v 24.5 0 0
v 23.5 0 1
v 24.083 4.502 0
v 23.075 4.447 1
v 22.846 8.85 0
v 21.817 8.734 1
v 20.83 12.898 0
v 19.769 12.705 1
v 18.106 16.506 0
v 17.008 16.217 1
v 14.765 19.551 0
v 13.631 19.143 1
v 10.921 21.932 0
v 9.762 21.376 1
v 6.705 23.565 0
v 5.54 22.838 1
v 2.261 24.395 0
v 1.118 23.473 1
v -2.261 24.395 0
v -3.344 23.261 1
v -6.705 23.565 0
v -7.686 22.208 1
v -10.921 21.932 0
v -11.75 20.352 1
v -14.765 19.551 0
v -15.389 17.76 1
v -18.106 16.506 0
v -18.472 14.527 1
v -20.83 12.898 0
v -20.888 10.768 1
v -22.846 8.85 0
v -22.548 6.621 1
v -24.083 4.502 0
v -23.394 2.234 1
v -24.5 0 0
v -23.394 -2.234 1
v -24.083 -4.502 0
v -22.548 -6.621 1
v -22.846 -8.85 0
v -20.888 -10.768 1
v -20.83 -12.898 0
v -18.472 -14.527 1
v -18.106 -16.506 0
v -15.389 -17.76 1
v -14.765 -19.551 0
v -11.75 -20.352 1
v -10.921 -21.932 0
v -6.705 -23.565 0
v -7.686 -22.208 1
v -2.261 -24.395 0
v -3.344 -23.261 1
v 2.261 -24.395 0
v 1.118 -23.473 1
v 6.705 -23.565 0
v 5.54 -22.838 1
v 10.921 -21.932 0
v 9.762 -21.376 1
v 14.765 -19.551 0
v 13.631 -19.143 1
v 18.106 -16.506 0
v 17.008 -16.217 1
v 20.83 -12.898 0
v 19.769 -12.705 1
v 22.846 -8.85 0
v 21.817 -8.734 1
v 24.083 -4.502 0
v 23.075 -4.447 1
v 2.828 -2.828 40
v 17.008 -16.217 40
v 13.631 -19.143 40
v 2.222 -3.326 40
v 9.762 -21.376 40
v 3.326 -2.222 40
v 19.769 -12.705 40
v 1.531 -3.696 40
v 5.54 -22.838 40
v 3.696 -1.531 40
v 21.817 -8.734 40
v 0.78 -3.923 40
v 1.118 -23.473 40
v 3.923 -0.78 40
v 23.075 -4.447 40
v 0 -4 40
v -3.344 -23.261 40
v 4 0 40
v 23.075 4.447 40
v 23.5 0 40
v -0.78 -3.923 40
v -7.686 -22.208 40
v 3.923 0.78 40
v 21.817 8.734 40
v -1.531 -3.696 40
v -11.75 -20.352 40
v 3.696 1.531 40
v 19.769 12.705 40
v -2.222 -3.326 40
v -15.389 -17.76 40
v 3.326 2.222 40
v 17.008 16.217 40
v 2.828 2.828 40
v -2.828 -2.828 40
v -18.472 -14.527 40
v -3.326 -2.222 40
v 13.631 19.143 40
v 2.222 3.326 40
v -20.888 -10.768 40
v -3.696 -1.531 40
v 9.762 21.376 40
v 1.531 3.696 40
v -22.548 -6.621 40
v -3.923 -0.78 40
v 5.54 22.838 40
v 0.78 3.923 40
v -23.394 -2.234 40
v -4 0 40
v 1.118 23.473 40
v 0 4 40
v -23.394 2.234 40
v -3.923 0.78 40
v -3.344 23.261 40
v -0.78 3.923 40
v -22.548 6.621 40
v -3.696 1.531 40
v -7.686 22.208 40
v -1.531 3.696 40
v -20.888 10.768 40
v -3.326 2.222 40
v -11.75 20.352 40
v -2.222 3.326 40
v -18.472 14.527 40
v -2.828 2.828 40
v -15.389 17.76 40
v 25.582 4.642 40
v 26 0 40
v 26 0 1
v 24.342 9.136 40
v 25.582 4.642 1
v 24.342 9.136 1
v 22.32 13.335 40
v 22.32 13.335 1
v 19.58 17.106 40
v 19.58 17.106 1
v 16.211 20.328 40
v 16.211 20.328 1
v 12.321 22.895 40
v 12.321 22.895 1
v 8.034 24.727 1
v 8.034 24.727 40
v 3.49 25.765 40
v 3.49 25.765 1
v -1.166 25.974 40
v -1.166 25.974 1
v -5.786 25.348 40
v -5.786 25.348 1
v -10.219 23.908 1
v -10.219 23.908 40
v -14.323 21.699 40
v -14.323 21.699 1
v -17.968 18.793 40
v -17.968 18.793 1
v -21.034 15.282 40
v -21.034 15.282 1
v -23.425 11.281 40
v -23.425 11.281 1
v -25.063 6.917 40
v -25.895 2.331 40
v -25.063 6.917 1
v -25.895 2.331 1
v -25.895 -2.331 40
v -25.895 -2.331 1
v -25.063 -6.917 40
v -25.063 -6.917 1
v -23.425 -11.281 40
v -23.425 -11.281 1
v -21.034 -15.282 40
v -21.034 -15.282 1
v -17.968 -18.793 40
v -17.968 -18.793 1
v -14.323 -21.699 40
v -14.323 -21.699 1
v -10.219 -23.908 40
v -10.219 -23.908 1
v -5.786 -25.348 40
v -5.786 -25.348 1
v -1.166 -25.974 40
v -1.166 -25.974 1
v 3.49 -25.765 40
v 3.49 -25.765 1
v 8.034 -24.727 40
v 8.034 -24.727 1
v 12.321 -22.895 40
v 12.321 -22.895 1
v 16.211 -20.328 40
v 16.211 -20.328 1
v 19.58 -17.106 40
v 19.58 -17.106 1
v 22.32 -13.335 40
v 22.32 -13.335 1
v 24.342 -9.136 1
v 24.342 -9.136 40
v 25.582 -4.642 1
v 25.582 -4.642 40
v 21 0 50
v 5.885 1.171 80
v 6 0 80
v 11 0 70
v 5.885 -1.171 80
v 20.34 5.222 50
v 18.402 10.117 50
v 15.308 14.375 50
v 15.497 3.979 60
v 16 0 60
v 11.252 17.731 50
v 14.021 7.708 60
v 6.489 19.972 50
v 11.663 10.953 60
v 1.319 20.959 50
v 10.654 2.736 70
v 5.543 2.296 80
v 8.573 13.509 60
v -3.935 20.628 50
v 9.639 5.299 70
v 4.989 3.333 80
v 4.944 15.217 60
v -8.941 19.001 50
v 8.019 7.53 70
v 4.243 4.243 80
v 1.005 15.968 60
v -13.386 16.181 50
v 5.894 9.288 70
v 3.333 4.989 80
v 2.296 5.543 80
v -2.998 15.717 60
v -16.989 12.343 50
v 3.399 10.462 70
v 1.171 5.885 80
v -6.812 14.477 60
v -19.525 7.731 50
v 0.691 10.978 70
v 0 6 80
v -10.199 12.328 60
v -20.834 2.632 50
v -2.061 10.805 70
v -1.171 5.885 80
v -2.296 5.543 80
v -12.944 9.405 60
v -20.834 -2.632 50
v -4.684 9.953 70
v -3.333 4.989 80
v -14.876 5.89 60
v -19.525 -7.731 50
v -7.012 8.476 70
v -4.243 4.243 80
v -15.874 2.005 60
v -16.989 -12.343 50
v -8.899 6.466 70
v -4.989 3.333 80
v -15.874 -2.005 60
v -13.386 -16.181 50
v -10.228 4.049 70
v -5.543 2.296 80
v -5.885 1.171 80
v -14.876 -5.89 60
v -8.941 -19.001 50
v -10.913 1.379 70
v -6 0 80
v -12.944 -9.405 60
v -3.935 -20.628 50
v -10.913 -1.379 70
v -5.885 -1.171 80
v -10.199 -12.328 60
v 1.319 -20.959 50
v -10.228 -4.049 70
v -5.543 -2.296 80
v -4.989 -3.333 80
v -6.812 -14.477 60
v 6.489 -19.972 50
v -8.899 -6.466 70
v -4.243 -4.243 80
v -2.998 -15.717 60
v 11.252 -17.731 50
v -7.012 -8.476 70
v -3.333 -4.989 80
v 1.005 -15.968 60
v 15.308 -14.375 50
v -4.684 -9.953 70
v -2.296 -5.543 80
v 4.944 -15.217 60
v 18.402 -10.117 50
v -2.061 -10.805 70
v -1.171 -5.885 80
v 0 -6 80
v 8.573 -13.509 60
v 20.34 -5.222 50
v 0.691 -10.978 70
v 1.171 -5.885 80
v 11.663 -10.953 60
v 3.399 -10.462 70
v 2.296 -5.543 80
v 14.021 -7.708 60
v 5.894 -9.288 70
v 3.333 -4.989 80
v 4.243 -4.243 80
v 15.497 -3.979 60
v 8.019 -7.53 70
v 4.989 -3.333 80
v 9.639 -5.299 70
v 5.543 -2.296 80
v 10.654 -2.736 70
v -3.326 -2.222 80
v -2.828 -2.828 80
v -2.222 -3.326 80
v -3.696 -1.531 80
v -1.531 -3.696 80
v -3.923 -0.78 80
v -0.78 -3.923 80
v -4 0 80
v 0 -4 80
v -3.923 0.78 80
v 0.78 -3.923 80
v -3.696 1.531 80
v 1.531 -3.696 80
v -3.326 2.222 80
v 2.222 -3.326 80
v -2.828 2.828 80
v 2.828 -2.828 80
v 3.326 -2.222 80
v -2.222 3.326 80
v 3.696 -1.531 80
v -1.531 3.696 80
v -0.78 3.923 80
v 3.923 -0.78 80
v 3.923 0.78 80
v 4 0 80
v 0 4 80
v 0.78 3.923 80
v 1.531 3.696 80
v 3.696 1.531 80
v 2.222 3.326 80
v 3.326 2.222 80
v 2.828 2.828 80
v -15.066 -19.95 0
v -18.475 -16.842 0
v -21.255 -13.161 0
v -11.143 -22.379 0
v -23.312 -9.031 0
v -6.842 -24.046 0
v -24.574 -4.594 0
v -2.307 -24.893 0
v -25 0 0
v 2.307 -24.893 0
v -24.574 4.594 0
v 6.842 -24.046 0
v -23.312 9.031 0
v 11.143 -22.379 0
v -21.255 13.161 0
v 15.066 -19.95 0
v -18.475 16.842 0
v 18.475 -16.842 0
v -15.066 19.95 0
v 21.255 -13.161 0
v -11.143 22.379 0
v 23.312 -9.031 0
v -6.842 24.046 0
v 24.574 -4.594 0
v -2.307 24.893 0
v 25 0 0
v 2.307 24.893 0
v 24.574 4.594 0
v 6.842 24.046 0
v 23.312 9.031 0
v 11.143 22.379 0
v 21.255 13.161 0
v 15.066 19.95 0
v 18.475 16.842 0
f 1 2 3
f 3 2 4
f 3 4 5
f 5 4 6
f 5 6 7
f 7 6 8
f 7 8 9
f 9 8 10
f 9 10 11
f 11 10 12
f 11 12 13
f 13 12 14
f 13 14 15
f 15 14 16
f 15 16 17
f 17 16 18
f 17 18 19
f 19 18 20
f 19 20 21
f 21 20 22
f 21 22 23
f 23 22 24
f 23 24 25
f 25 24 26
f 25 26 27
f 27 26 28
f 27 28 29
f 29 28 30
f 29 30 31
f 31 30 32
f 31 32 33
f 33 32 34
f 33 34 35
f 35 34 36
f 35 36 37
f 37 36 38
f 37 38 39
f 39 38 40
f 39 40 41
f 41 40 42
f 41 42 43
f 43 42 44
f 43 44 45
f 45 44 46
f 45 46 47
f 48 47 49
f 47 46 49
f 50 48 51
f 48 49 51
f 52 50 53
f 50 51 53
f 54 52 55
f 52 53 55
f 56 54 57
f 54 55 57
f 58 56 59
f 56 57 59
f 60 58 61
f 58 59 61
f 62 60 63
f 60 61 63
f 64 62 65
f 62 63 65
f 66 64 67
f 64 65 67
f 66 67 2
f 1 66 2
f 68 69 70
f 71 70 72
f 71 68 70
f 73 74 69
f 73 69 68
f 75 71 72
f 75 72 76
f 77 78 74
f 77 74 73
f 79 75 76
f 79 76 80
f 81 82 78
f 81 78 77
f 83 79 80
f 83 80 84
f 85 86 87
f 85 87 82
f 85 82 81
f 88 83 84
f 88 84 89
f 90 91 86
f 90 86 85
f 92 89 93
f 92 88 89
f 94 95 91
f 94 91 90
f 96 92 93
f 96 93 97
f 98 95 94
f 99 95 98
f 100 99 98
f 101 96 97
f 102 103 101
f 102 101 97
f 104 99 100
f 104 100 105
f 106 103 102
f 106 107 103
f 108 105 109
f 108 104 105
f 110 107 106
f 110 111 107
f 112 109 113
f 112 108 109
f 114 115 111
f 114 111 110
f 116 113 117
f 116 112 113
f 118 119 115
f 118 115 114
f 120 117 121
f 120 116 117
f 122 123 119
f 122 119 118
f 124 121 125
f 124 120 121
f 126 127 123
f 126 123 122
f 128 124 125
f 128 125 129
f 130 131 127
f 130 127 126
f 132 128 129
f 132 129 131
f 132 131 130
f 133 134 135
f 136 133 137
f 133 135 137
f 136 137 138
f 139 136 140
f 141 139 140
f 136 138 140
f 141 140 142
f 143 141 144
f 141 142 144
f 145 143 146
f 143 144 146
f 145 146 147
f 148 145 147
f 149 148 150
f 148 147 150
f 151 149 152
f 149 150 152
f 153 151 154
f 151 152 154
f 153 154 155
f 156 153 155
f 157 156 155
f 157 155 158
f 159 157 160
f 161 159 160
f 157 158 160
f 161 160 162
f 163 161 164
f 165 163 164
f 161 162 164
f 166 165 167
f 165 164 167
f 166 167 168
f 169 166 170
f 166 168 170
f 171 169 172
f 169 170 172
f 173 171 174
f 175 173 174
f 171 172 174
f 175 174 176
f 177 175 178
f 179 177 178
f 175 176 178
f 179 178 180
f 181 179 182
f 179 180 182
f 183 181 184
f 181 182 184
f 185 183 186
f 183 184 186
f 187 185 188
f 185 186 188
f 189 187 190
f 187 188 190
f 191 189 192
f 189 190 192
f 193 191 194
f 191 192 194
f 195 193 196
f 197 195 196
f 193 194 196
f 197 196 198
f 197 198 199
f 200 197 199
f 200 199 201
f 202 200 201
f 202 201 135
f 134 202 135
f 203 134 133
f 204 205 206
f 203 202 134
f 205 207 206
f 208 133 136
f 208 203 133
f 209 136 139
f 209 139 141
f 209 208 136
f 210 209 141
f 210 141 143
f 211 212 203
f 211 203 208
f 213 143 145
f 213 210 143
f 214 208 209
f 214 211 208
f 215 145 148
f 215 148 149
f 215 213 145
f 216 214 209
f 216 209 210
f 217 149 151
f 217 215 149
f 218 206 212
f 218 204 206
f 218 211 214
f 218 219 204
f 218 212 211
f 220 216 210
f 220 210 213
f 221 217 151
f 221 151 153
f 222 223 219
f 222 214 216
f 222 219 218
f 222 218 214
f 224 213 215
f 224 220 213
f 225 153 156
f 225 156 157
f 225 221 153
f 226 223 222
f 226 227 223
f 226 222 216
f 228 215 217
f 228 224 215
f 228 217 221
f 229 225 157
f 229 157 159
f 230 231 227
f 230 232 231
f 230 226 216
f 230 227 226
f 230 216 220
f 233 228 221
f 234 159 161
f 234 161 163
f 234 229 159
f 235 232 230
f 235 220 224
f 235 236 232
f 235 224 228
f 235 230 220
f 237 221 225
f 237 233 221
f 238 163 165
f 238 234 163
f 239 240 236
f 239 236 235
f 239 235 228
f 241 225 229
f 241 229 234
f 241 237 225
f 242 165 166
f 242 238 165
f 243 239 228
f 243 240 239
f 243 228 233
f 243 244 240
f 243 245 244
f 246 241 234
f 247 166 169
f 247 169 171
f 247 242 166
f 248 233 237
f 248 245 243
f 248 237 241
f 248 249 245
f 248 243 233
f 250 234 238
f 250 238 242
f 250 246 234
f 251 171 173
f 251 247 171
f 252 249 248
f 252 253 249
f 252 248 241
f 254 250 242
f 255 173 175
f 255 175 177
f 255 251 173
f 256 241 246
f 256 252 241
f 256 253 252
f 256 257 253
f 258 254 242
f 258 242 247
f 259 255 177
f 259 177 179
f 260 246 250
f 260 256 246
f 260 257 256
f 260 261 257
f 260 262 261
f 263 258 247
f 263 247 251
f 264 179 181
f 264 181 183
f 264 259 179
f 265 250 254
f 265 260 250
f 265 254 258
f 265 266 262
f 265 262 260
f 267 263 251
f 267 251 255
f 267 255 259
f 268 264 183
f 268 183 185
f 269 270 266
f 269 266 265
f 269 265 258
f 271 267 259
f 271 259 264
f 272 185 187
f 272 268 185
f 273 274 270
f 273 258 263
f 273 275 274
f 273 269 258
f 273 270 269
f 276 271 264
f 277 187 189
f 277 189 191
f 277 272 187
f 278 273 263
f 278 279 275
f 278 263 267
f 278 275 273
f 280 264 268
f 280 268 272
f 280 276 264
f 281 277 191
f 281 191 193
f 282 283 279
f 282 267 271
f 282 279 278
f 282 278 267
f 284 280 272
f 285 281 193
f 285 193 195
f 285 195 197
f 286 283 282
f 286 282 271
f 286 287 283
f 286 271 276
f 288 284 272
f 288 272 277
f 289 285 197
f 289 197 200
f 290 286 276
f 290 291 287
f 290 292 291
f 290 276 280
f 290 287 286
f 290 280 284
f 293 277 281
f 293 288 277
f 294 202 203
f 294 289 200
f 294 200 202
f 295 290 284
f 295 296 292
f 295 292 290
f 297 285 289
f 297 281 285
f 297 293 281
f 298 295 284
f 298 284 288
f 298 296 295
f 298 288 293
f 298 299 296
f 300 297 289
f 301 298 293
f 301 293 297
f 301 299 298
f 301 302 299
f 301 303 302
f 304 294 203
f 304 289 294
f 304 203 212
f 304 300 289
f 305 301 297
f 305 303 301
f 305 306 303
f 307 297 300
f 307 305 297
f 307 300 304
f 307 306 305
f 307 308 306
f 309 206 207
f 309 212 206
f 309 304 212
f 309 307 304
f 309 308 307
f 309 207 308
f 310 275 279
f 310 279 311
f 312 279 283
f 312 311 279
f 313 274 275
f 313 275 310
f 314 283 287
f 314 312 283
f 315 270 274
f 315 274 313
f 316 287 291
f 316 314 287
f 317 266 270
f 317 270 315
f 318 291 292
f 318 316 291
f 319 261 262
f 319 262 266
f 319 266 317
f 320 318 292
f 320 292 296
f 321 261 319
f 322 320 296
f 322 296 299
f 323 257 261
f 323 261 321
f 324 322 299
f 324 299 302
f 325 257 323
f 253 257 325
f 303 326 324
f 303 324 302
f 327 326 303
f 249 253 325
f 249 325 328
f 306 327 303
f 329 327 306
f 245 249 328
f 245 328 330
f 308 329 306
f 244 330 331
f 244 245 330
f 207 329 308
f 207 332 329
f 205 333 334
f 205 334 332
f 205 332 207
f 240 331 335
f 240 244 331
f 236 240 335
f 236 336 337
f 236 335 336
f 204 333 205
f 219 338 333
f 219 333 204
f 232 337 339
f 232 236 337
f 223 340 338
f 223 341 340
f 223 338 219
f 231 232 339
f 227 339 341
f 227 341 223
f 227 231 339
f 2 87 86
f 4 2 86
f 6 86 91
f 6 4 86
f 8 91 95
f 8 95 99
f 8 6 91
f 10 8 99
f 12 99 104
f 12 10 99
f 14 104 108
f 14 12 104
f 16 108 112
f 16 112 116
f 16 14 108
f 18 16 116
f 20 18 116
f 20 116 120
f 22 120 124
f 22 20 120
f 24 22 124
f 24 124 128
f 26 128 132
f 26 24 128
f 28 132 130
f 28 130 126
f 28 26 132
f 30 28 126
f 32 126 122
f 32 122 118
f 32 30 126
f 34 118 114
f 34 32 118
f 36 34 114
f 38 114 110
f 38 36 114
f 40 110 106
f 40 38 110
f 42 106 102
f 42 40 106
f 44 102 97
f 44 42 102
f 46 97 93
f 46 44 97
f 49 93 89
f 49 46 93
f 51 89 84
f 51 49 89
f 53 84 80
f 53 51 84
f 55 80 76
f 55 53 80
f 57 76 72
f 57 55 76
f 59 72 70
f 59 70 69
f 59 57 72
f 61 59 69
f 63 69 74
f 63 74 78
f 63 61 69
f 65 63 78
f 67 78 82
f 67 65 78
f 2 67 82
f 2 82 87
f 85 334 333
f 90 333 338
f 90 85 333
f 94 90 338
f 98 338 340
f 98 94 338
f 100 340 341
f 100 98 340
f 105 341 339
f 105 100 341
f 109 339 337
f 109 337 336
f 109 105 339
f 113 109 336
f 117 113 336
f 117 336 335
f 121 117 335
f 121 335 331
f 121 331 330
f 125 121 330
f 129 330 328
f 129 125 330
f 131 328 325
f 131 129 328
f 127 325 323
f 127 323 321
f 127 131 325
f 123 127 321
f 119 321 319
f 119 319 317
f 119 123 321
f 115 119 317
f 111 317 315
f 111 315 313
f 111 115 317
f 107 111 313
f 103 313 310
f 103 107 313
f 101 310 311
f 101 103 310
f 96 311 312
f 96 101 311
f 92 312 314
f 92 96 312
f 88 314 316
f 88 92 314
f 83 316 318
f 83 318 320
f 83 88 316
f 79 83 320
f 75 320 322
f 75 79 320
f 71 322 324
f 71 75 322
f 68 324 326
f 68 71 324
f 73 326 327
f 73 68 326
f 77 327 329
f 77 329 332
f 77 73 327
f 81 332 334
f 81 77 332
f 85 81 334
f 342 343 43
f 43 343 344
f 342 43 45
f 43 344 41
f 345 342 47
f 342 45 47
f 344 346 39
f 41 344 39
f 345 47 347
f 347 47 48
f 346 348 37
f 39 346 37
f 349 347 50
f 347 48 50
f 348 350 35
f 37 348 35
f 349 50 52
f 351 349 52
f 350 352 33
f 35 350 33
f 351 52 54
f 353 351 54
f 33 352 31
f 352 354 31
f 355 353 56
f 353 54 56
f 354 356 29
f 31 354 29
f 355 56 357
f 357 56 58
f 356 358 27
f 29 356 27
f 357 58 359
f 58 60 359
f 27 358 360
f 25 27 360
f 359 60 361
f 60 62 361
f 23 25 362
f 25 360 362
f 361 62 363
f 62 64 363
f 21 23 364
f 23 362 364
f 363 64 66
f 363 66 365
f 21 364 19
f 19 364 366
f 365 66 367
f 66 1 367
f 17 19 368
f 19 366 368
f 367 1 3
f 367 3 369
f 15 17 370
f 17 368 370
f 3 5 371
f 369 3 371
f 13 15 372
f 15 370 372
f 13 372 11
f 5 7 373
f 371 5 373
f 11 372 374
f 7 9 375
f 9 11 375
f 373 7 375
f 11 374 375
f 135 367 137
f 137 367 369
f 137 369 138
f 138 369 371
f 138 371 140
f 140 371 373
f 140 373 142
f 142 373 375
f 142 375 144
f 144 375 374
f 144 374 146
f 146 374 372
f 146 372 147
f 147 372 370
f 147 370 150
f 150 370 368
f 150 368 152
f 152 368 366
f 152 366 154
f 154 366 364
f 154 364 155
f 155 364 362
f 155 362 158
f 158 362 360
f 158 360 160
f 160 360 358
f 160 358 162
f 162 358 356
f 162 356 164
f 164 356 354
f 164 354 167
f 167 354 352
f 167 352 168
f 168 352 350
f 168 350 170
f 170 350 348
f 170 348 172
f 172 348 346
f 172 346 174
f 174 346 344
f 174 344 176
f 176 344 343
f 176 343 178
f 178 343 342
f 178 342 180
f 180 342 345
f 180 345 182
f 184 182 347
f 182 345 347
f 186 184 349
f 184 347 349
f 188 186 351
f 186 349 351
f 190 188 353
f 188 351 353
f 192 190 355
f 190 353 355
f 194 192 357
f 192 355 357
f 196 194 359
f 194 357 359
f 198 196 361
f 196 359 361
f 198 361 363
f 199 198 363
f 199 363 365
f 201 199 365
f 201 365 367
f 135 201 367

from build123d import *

# Parameters (mm, degrees)
CYLINDER_R     = 4
CYLINDER_DEPTH = 40
TUBE_R         = 26
TUBE_R_2       = 23.5
TUBE_DEPTH     = 40
CHAMFER_SIZE   = 1


with BuildPart() as cylinder:
    # Cylinder → Cylinder (new body)
    with BuildSketch(Plane.XY.offset(40)):
        Circle(CYLINDER_R)
    extrude(amount=CYLINDER_DEPTH)


with BuildPart() as tube:
    # Tube → Tube (new body)
    with BuildSketch(Plane.XY):
        Circle(TUBE_R)
        Circle(TUBE_R_2, mode=Mode.SUBTRACT)
    extrude(amount=TUBE_DEPTH)


with BuildPart() as chamfer_body:
    # Cone → Cone (revolve)
    with BuildSketch(Plane(origin=(0, 0, 40), x_dir=(1, 0, 0), z_dir=(0, -1, 0))):
        Polygon((0, 0), (26, 0), (6, 40), (0, 40), align=None)
    revolve(axis=Axis((0, 0, 40), (0, 0, 1)))

    # Fusion: union Tube
    add(tube.part)

    # Cut: cut Cylinder
    add(cylinder.part, mode=Mode.SUBTRACT)

    # Chamfer
    chamfer_edges = [chamfer_body.edges().sort_by_distance(p)[0] for p in [
        (-26, 0, 0),
        (-23.5, 0, 0),
    ]]
    chamfer(chamfer_edges, length=CHAMFER_SIZE)


solid = chamfer_body.part
